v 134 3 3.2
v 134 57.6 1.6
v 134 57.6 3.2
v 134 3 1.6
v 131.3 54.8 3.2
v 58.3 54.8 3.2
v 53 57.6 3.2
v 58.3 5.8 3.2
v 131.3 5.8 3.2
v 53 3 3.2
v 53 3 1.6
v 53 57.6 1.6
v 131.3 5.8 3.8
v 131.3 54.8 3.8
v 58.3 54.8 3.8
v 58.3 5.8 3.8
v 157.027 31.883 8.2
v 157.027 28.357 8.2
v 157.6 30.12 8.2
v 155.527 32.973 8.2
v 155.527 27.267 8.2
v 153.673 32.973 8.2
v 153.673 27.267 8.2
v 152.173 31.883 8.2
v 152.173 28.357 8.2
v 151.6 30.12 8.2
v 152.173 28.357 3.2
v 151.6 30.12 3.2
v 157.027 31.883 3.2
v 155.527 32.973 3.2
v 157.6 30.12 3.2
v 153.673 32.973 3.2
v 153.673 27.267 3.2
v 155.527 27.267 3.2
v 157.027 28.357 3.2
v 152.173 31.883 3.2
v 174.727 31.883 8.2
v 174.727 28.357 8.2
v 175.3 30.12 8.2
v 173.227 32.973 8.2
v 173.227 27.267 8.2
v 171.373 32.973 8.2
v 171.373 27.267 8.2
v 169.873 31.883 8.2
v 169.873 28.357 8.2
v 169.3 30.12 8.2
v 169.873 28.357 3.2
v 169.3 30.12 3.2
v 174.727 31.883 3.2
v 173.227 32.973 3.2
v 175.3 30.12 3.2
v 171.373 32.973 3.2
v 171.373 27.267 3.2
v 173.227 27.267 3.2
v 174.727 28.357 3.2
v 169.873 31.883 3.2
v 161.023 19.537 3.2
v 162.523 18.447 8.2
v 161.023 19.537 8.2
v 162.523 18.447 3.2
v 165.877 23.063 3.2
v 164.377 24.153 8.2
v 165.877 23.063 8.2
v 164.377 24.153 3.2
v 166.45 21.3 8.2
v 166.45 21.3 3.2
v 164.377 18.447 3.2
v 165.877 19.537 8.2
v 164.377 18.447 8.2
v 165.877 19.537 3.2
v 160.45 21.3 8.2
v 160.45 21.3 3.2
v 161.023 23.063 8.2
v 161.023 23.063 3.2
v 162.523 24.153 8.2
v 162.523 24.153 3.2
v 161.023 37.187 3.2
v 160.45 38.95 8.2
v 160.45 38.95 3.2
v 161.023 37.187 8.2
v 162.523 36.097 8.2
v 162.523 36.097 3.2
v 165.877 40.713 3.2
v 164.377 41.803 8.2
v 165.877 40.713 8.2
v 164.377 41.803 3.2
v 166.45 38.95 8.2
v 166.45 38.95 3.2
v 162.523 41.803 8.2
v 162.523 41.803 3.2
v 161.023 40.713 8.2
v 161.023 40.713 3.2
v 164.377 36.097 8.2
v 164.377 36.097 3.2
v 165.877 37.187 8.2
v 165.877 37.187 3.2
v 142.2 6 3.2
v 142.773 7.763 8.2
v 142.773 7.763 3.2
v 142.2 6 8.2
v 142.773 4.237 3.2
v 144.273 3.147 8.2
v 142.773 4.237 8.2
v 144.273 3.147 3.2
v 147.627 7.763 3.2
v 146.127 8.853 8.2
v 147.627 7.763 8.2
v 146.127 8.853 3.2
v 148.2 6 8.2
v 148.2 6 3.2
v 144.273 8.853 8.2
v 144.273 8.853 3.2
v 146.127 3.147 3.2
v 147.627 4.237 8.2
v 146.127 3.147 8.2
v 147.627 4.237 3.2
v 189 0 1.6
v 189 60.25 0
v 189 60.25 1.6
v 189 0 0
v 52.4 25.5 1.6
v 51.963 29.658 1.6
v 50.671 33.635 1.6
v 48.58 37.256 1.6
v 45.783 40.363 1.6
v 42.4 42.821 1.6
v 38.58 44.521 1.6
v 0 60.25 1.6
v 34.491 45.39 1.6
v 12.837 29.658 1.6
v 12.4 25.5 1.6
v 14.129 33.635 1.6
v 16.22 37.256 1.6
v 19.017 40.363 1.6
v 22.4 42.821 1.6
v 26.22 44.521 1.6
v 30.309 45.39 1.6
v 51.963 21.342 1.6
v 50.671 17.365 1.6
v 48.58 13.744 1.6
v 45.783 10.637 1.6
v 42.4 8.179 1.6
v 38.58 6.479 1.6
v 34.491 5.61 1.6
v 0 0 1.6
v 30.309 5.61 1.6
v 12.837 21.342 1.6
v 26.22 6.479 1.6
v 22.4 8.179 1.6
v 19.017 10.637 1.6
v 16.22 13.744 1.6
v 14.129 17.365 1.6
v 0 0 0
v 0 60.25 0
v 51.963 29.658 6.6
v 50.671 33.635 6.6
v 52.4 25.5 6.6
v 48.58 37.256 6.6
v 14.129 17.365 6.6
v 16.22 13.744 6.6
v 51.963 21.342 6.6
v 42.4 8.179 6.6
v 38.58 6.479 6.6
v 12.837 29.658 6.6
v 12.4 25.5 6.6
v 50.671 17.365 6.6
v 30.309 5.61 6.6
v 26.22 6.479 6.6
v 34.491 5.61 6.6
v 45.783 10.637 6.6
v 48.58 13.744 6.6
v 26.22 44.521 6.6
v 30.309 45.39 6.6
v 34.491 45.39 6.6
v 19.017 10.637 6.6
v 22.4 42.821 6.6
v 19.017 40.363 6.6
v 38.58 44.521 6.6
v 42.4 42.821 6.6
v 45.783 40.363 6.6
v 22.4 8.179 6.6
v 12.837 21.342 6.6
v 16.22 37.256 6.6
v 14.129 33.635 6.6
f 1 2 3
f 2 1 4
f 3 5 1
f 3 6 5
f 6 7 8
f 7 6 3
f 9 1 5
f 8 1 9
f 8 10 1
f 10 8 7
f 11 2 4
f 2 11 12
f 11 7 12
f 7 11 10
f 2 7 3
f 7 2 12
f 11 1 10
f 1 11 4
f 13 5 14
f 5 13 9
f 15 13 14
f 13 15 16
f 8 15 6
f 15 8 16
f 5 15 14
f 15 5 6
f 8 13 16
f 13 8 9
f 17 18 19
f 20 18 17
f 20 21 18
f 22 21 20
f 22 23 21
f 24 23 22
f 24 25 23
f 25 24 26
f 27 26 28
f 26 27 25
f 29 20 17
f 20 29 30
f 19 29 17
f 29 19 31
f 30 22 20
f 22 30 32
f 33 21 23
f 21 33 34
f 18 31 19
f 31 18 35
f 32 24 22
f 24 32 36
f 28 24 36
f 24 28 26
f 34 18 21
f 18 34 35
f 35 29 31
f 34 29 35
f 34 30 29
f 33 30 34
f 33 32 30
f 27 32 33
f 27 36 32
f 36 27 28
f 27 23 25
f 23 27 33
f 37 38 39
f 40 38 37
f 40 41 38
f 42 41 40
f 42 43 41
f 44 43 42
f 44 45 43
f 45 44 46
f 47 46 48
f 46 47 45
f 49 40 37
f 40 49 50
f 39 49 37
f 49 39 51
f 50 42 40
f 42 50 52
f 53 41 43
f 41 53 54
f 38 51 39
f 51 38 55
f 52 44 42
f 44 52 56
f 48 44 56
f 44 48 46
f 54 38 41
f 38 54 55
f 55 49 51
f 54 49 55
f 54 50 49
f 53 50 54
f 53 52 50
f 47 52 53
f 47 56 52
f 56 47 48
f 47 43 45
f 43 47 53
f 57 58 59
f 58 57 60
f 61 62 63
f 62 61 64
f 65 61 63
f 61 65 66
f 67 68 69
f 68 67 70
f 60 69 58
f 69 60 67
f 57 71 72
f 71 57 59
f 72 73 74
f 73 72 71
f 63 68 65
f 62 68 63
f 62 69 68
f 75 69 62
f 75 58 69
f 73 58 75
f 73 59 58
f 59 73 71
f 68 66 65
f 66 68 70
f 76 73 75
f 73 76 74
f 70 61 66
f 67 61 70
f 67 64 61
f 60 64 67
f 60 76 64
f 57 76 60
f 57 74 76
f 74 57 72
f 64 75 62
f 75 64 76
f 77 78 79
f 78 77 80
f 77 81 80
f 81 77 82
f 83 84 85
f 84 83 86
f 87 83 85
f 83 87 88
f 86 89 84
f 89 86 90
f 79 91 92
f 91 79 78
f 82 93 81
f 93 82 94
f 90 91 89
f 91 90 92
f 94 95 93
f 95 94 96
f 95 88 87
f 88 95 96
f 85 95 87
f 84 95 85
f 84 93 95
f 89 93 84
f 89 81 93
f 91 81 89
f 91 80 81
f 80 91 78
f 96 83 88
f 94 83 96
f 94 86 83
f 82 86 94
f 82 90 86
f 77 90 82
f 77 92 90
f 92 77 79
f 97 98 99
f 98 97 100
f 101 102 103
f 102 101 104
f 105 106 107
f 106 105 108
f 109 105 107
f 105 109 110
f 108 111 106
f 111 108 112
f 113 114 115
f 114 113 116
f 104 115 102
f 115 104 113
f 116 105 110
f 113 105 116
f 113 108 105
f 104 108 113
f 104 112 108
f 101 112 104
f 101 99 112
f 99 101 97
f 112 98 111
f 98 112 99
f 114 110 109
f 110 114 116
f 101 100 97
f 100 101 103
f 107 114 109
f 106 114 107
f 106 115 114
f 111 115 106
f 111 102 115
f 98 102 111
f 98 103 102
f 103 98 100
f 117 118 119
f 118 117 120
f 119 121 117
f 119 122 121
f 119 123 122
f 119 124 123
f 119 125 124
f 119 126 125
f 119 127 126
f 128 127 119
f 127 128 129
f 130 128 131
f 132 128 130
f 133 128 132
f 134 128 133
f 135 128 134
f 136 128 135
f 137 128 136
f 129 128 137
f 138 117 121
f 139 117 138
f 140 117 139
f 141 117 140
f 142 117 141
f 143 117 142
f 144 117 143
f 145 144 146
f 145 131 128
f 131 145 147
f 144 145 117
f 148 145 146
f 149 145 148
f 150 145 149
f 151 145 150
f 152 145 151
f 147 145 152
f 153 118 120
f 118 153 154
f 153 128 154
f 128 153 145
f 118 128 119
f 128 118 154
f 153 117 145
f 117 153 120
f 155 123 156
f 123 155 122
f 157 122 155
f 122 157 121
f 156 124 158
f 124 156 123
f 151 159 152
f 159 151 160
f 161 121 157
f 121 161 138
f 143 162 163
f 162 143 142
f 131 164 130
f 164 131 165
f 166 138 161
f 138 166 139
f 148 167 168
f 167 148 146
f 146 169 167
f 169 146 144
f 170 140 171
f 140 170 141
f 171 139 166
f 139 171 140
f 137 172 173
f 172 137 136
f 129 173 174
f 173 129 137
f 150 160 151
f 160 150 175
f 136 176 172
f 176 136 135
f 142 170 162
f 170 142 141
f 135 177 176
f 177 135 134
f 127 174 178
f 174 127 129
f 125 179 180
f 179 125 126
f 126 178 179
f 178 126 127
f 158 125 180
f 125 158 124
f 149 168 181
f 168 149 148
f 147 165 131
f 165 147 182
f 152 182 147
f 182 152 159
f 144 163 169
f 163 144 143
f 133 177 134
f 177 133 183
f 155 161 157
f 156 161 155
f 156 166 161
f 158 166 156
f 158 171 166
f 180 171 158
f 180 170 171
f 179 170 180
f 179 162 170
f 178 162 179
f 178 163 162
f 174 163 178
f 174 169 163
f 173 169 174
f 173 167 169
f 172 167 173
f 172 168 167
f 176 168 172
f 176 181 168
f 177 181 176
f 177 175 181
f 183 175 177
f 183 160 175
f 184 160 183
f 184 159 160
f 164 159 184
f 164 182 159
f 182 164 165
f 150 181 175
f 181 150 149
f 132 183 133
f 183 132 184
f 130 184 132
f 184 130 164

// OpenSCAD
T = 1.6;
WLEFT = 53;
WRIGHT = 55;
WDISP = 81; // Total width of the display.
HDISP = 54.6; // Total height of the display.
WSCR = 73; // Width of the display's visible part.
HSCR = 49; // Height of the display's visible part.
H = 60.25;
W = WLEFT + WDISP + WRIGHT;
MDISP = 3;
DPAD = 40;
RPAD = DPAD / 2;

module v1_pcb() {
  color("green")
    cube([W, H, T]);
  translate([WLEFT, MDISP, T]) {
    color("#AAAAAA")
      cube([WDISP, HDISP, T]);
    color("#444444")
      translate([5.30, (HDISP - HSCR) / 2, .1])
        cube([WSCR, HSCR, T + .5]);
  }
  color("gray")
    translate([12.40 + RPAD, 5.5 + RPAD, T])
      cylinder(h=5, r=RPAD);
  color("purple") {
    translate([WLEFT + WDISP + 11.20, MDISP + 3, T])
      button();
    translate([WLEFT + WDISP, 0, T])
      buttons();
  }
}

module buttons() {
  // west
  translate([20.6, 30.12, 0])
    button();
  // east
  translate([20.6 + 17.70, 30.12, 0])
    button();
  // south
  translate([20.6 + 17.7 / 2, 21.30, 0])
    button();
  // north
  translate([20.6 + 17.7 / 2, H - 21.30, 0])
    button();
}

module button() {
  translate([0, 0, T])
    cylinder(h=5, r=3);
}

v1_pcb();
